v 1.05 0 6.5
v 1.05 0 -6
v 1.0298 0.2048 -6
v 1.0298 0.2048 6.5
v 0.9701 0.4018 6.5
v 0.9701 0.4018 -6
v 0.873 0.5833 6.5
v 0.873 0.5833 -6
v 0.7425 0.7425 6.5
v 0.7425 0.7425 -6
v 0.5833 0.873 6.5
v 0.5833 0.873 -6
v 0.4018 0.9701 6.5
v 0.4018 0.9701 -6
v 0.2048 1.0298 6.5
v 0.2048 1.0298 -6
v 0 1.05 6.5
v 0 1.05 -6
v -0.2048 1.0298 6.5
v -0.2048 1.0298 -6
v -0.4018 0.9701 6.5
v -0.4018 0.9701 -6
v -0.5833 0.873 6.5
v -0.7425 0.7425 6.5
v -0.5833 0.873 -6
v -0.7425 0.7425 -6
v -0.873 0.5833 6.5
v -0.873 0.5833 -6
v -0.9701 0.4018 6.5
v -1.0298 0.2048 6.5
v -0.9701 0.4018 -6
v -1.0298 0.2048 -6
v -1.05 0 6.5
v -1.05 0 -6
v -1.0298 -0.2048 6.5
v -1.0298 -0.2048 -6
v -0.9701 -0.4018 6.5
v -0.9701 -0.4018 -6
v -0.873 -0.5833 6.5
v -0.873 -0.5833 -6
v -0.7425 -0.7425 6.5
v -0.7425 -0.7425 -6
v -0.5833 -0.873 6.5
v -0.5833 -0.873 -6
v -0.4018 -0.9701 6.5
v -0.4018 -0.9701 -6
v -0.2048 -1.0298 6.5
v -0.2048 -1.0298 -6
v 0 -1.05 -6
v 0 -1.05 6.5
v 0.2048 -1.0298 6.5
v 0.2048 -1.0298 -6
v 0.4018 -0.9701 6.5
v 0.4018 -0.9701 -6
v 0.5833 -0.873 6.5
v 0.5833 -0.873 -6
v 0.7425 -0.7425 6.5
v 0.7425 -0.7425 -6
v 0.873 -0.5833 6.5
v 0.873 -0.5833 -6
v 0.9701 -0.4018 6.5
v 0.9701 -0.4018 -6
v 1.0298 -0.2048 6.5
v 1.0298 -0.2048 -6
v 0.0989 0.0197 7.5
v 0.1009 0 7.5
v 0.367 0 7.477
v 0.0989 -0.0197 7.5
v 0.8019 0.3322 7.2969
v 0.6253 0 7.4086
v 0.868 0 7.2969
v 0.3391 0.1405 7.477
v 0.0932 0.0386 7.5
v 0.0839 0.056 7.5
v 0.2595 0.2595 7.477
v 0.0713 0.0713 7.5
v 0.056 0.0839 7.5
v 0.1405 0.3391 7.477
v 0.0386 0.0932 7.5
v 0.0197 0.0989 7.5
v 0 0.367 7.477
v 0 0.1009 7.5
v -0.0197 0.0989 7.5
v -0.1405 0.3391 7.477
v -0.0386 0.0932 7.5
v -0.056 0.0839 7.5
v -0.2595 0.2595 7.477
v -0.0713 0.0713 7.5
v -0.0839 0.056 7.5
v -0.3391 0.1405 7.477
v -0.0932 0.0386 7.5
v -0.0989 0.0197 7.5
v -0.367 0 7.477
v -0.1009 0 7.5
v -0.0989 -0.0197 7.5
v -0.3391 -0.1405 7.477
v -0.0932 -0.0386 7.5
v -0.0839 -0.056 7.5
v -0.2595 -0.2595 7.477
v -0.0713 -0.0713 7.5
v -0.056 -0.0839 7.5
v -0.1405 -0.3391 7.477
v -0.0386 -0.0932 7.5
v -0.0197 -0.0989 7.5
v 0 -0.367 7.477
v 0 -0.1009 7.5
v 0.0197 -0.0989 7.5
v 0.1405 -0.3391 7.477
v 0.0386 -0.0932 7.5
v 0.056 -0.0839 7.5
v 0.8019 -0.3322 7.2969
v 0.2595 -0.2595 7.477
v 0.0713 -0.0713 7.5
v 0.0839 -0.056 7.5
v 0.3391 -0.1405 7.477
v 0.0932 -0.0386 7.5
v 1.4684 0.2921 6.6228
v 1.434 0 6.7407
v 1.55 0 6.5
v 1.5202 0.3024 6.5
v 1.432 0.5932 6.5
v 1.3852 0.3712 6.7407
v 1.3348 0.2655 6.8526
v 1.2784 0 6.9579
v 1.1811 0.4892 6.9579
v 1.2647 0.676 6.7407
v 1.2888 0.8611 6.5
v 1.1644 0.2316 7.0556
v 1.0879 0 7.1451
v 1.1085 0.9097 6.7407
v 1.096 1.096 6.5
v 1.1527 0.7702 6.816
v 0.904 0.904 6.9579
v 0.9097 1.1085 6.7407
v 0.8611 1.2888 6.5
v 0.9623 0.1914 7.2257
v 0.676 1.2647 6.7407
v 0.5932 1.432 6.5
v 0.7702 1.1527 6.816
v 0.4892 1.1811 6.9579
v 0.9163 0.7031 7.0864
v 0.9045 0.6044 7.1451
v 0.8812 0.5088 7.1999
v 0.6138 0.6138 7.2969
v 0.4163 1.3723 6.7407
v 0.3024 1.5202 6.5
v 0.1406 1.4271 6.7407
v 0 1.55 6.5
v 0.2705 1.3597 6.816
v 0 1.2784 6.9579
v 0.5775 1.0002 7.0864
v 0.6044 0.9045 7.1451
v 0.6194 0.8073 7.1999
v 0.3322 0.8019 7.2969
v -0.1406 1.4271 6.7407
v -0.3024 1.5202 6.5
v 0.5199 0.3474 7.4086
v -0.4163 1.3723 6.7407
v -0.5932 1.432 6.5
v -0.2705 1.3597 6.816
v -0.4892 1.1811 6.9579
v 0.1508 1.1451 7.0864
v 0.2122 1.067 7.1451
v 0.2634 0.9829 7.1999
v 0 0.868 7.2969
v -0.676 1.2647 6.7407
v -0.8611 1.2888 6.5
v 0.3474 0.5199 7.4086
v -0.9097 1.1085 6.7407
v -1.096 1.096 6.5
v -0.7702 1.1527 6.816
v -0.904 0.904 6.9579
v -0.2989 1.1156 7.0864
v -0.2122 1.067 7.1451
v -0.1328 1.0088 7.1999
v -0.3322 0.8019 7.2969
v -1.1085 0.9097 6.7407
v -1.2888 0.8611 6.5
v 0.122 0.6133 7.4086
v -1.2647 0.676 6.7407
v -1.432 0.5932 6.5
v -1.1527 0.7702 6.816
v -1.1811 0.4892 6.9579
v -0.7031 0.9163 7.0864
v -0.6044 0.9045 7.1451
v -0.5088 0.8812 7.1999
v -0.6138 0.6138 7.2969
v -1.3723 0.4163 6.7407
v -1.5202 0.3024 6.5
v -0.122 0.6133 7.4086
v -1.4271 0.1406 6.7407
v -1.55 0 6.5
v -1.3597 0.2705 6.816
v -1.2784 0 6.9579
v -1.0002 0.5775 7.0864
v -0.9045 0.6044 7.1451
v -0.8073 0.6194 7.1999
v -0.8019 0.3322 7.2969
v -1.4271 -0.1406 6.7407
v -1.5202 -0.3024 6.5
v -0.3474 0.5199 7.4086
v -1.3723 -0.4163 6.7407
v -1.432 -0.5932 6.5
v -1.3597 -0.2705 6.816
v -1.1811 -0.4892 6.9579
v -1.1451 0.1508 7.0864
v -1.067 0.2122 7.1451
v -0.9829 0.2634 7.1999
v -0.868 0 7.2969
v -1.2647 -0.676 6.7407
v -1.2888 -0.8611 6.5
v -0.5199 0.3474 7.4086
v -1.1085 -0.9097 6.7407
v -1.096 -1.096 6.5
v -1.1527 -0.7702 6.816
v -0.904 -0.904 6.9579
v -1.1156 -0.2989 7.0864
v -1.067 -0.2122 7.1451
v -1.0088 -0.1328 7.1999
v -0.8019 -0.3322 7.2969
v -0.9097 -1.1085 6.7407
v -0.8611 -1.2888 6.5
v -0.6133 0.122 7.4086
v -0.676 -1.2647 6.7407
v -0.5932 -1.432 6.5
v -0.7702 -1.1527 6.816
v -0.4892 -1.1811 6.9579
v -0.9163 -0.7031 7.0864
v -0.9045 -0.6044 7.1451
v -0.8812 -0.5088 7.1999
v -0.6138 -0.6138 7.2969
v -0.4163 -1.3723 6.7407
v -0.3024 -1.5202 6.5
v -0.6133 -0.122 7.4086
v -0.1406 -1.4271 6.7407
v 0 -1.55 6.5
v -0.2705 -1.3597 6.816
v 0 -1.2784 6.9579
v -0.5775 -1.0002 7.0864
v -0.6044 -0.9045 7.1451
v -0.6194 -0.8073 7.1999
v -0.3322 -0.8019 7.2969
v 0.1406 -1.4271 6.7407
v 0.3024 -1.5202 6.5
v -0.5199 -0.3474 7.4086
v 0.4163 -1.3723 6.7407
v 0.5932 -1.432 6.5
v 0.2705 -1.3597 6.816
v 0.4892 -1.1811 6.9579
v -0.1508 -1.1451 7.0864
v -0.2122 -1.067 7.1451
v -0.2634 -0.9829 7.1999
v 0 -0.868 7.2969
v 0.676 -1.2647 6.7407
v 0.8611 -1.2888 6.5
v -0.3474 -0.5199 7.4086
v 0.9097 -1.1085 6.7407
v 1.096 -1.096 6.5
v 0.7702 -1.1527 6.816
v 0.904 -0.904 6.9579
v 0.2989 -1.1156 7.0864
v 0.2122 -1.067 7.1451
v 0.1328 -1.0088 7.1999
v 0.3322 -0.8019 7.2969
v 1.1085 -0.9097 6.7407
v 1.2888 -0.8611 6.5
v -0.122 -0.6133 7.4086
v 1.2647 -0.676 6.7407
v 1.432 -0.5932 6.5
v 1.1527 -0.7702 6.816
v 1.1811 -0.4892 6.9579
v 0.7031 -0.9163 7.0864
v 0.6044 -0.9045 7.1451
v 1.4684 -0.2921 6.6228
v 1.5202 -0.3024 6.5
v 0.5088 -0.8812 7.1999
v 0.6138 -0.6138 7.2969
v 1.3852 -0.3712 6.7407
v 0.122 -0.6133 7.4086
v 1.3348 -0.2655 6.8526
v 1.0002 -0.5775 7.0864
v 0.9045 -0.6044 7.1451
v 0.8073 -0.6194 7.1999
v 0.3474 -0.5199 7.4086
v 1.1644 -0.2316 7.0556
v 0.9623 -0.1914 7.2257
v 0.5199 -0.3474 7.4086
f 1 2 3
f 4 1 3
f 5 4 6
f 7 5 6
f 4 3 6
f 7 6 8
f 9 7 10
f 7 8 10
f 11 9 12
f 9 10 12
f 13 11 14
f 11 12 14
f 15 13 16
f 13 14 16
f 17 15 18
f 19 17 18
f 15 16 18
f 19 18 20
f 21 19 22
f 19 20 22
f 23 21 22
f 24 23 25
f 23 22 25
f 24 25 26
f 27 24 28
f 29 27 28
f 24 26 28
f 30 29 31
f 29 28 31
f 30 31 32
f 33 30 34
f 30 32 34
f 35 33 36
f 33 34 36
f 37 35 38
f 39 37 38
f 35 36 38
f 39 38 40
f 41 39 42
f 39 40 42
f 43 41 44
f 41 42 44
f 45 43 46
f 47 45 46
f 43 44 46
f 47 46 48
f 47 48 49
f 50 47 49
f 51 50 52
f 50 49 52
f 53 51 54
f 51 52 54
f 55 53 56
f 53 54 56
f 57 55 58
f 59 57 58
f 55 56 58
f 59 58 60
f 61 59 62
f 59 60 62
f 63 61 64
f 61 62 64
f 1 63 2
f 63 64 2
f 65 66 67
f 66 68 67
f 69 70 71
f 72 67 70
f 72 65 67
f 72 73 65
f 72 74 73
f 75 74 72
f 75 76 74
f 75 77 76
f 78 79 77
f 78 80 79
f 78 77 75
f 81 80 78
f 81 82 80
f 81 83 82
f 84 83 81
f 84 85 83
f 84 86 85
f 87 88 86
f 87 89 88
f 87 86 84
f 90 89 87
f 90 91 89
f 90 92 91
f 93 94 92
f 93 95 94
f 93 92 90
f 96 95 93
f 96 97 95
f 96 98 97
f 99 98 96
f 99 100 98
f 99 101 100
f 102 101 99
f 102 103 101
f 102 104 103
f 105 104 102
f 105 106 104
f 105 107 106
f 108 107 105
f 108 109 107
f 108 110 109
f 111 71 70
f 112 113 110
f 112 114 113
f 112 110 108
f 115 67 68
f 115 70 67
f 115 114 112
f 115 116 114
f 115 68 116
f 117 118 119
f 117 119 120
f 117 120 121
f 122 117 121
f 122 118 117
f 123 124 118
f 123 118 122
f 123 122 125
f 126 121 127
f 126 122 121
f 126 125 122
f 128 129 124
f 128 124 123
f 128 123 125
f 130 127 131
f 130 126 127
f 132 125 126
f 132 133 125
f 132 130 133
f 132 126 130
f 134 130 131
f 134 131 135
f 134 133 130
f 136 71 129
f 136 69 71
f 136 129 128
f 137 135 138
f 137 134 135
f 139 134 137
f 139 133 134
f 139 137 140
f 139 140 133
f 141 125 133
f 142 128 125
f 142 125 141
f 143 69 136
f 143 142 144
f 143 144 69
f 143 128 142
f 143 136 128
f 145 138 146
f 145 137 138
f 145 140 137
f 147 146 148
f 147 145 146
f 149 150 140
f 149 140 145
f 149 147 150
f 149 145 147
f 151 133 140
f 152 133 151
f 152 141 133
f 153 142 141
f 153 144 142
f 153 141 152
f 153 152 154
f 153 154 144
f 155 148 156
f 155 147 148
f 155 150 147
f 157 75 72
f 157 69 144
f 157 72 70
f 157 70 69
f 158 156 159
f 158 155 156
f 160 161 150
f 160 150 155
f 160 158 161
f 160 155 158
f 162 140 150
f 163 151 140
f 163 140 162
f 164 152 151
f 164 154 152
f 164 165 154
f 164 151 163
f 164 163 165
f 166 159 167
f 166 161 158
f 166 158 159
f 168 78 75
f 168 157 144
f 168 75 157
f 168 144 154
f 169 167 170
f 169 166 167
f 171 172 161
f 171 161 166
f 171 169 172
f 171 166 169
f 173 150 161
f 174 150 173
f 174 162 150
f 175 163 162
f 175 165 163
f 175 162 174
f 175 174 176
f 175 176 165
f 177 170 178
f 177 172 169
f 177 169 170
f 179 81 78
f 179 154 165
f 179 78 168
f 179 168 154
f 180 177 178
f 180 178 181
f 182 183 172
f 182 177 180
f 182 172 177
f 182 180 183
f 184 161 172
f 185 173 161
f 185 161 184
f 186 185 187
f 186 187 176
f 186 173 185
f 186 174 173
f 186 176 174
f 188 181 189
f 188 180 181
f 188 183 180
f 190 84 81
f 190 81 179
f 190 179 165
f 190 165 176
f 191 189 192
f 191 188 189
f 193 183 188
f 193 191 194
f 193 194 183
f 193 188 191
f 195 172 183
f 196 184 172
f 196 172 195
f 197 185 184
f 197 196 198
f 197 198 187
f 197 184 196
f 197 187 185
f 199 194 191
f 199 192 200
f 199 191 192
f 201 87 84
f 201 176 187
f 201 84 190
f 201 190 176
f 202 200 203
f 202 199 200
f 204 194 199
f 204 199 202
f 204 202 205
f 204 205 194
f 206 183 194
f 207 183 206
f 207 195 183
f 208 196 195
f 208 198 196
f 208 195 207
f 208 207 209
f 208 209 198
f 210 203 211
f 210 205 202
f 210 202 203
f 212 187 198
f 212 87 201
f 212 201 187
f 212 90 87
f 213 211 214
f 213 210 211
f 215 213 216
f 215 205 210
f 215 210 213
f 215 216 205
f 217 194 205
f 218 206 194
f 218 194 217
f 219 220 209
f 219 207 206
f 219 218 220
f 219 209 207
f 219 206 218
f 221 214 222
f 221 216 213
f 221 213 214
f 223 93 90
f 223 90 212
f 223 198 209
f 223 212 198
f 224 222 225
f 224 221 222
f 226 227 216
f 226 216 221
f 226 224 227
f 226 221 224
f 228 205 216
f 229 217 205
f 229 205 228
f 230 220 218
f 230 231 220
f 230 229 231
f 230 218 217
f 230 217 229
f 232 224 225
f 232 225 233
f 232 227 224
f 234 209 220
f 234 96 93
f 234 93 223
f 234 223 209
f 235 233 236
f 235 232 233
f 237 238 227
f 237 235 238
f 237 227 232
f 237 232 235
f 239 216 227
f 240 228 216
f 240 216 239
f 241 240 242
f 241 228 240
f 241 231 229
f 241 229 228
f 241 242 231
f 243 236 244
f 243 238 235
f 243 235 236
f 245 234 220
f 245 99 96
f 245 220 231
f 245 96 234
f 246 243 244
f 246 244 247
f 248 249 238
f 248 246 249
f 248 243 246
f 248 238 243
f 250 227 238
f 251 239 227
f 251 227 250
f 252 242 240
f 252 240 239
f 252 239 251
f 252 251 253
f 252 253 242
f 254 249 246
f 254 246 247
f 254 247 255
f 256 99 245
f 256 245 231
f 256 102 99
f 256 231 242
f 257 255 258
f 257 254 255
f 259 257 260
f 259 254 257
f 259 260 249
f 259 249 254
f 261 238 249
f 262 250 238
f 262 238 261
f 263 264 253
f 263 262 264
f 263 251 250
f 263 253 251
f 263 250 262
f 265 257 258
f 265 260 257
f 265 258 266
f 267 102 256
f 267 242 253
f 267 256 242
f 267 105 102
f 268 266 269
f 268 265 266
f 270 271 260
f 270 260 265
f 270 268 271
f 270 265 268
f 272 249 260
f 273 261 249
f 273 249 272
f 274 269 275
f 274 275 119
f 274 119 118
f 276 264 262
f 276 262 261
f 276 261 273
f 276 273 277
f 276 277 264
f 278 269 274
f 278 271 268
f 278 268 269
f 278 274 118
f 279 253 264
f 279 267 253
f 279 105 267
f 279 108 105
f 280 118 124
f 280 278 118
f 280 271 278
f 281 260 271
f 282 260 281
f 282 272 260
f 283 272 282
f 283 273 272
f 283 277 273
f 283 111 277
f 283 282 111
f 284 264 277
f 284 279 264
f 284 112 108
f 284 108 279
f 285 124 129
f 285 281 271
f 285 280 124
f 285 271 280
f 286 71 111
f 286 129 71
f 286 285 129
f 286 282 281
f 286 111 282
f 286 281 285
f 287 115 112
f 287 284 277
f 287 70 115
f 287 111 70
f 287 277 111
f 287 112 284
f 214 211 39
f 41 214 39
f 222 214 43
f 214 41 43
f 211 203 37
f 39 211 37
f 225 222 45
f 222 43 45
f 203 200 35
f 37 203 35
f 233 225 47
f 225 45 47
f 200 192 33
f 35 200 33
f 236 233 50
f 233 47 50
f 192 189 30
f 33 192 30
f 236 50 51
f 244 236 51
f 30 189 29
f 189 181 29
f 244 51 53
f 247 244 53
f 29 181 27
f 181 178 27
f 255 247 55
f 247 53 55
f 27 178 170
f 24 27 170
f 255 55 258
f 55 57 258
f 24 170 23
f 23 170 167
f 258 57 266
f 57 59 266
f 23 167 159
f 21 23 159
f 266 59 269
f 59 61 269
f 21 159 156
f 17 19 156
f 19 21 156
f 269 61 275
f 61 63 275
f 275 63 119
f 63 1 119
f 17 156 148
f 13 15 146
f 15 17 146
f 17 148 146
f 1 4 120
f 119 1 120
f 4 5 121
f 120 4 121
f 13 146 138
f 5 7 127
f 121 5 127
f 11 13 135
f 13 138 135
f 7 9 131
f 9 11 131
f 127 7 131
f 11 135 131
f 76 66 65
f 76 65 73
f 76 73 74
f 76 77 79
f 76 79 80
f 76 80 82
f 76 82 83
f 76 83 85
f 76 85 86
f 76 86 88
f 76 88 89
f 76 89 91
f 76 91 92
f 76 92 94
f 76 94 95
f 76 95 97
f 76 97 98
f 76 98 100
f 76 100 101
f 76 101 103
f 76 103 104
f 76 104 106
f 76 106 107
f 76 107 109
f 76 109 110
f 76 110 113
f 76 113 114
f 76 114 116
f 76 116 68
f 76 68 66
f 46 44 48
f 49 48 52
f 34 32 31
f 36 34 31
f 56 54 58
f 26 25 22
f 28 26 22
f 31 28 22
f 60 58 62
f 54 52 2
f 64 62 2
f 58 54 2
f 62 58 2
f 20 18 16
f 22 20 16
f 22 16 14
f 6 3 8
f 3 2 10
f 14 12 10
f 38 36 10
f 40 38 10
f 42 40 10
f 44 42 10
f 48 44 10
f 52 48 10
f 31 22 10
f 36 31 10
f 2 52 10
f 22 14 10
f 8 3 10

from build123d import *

# Parameters (mm, degrees)
DODANIE_WYCI_GNI_CIE1_DEPTH      = 6.5
DODANIE_WYCI_GNI_CIE1_DEPTH_BACK = 6
SZKIC1_R                         = 1.05
SZKIC2_R                         = 1.55
DODANIE_WYCI_GNI_CIE2_DEPTH      = 1
ZAOKR_GLENIE1_R                  = 1.55


with BuildPart() as part:
    # Szkic1 → Dodanie-wyciągnięcie1 (new, two sides: drawn at the far end of the back side and taken through both)
    with BuildSketch(Plane.XY.offset(-DODANIE_WYCI_GNI_CIE1_DEPTH_BACK)):
        Circle(SZKIC1_R)
    extrude(amount=DODANIE_WYCI_GNI_CIE1_DEPTH + DODANIE_WYCI_GNI_CIE1_DEPTH_BACK)

    # Szkic2 → Dodanie-wyciągnięcie2 (add)
    with BuildSketch(Plane.XY.offset(6.5)):
        Circle(SZKIC2_R)
    extrude(amount=DODANIE_WYCI_GNI_CIE2_DEPTH)

    # Zaokrąglenie1
    # the kernel refuses this fillet: 1.55 mm, written as the material it takes off along each edge
    with BuildSketch(Plane(origin=(0, 0, 7.5), x_dir=(1, 0, 0), z_dir=(0, -1, 0))) as zaokr_glenie1_piece_1:
        with BuildLine():
            CenterArc((0.100862325, -1.55), ZAOKR_GLENIE1_R, 20.783559596, 69.216440404)
            Line((0.100862325, 0), (0.100862325, 0.031))
            Line((0.100862325, 0.031), (1.55, 0.031))
            Line((1.55, 0.031), (1.581, 0))
            ThreePointArc((1.581, 0), (1.581, -0.5), (1.578982753, -0.989))
            Line((1.578982753, -0.989), (1.55, -1))
        make_face()
    revolve(axis=Axis((0, 0, 7.5), (0, 0, 1)), mode=Mode.SUBTRACT)


solid = part.part
